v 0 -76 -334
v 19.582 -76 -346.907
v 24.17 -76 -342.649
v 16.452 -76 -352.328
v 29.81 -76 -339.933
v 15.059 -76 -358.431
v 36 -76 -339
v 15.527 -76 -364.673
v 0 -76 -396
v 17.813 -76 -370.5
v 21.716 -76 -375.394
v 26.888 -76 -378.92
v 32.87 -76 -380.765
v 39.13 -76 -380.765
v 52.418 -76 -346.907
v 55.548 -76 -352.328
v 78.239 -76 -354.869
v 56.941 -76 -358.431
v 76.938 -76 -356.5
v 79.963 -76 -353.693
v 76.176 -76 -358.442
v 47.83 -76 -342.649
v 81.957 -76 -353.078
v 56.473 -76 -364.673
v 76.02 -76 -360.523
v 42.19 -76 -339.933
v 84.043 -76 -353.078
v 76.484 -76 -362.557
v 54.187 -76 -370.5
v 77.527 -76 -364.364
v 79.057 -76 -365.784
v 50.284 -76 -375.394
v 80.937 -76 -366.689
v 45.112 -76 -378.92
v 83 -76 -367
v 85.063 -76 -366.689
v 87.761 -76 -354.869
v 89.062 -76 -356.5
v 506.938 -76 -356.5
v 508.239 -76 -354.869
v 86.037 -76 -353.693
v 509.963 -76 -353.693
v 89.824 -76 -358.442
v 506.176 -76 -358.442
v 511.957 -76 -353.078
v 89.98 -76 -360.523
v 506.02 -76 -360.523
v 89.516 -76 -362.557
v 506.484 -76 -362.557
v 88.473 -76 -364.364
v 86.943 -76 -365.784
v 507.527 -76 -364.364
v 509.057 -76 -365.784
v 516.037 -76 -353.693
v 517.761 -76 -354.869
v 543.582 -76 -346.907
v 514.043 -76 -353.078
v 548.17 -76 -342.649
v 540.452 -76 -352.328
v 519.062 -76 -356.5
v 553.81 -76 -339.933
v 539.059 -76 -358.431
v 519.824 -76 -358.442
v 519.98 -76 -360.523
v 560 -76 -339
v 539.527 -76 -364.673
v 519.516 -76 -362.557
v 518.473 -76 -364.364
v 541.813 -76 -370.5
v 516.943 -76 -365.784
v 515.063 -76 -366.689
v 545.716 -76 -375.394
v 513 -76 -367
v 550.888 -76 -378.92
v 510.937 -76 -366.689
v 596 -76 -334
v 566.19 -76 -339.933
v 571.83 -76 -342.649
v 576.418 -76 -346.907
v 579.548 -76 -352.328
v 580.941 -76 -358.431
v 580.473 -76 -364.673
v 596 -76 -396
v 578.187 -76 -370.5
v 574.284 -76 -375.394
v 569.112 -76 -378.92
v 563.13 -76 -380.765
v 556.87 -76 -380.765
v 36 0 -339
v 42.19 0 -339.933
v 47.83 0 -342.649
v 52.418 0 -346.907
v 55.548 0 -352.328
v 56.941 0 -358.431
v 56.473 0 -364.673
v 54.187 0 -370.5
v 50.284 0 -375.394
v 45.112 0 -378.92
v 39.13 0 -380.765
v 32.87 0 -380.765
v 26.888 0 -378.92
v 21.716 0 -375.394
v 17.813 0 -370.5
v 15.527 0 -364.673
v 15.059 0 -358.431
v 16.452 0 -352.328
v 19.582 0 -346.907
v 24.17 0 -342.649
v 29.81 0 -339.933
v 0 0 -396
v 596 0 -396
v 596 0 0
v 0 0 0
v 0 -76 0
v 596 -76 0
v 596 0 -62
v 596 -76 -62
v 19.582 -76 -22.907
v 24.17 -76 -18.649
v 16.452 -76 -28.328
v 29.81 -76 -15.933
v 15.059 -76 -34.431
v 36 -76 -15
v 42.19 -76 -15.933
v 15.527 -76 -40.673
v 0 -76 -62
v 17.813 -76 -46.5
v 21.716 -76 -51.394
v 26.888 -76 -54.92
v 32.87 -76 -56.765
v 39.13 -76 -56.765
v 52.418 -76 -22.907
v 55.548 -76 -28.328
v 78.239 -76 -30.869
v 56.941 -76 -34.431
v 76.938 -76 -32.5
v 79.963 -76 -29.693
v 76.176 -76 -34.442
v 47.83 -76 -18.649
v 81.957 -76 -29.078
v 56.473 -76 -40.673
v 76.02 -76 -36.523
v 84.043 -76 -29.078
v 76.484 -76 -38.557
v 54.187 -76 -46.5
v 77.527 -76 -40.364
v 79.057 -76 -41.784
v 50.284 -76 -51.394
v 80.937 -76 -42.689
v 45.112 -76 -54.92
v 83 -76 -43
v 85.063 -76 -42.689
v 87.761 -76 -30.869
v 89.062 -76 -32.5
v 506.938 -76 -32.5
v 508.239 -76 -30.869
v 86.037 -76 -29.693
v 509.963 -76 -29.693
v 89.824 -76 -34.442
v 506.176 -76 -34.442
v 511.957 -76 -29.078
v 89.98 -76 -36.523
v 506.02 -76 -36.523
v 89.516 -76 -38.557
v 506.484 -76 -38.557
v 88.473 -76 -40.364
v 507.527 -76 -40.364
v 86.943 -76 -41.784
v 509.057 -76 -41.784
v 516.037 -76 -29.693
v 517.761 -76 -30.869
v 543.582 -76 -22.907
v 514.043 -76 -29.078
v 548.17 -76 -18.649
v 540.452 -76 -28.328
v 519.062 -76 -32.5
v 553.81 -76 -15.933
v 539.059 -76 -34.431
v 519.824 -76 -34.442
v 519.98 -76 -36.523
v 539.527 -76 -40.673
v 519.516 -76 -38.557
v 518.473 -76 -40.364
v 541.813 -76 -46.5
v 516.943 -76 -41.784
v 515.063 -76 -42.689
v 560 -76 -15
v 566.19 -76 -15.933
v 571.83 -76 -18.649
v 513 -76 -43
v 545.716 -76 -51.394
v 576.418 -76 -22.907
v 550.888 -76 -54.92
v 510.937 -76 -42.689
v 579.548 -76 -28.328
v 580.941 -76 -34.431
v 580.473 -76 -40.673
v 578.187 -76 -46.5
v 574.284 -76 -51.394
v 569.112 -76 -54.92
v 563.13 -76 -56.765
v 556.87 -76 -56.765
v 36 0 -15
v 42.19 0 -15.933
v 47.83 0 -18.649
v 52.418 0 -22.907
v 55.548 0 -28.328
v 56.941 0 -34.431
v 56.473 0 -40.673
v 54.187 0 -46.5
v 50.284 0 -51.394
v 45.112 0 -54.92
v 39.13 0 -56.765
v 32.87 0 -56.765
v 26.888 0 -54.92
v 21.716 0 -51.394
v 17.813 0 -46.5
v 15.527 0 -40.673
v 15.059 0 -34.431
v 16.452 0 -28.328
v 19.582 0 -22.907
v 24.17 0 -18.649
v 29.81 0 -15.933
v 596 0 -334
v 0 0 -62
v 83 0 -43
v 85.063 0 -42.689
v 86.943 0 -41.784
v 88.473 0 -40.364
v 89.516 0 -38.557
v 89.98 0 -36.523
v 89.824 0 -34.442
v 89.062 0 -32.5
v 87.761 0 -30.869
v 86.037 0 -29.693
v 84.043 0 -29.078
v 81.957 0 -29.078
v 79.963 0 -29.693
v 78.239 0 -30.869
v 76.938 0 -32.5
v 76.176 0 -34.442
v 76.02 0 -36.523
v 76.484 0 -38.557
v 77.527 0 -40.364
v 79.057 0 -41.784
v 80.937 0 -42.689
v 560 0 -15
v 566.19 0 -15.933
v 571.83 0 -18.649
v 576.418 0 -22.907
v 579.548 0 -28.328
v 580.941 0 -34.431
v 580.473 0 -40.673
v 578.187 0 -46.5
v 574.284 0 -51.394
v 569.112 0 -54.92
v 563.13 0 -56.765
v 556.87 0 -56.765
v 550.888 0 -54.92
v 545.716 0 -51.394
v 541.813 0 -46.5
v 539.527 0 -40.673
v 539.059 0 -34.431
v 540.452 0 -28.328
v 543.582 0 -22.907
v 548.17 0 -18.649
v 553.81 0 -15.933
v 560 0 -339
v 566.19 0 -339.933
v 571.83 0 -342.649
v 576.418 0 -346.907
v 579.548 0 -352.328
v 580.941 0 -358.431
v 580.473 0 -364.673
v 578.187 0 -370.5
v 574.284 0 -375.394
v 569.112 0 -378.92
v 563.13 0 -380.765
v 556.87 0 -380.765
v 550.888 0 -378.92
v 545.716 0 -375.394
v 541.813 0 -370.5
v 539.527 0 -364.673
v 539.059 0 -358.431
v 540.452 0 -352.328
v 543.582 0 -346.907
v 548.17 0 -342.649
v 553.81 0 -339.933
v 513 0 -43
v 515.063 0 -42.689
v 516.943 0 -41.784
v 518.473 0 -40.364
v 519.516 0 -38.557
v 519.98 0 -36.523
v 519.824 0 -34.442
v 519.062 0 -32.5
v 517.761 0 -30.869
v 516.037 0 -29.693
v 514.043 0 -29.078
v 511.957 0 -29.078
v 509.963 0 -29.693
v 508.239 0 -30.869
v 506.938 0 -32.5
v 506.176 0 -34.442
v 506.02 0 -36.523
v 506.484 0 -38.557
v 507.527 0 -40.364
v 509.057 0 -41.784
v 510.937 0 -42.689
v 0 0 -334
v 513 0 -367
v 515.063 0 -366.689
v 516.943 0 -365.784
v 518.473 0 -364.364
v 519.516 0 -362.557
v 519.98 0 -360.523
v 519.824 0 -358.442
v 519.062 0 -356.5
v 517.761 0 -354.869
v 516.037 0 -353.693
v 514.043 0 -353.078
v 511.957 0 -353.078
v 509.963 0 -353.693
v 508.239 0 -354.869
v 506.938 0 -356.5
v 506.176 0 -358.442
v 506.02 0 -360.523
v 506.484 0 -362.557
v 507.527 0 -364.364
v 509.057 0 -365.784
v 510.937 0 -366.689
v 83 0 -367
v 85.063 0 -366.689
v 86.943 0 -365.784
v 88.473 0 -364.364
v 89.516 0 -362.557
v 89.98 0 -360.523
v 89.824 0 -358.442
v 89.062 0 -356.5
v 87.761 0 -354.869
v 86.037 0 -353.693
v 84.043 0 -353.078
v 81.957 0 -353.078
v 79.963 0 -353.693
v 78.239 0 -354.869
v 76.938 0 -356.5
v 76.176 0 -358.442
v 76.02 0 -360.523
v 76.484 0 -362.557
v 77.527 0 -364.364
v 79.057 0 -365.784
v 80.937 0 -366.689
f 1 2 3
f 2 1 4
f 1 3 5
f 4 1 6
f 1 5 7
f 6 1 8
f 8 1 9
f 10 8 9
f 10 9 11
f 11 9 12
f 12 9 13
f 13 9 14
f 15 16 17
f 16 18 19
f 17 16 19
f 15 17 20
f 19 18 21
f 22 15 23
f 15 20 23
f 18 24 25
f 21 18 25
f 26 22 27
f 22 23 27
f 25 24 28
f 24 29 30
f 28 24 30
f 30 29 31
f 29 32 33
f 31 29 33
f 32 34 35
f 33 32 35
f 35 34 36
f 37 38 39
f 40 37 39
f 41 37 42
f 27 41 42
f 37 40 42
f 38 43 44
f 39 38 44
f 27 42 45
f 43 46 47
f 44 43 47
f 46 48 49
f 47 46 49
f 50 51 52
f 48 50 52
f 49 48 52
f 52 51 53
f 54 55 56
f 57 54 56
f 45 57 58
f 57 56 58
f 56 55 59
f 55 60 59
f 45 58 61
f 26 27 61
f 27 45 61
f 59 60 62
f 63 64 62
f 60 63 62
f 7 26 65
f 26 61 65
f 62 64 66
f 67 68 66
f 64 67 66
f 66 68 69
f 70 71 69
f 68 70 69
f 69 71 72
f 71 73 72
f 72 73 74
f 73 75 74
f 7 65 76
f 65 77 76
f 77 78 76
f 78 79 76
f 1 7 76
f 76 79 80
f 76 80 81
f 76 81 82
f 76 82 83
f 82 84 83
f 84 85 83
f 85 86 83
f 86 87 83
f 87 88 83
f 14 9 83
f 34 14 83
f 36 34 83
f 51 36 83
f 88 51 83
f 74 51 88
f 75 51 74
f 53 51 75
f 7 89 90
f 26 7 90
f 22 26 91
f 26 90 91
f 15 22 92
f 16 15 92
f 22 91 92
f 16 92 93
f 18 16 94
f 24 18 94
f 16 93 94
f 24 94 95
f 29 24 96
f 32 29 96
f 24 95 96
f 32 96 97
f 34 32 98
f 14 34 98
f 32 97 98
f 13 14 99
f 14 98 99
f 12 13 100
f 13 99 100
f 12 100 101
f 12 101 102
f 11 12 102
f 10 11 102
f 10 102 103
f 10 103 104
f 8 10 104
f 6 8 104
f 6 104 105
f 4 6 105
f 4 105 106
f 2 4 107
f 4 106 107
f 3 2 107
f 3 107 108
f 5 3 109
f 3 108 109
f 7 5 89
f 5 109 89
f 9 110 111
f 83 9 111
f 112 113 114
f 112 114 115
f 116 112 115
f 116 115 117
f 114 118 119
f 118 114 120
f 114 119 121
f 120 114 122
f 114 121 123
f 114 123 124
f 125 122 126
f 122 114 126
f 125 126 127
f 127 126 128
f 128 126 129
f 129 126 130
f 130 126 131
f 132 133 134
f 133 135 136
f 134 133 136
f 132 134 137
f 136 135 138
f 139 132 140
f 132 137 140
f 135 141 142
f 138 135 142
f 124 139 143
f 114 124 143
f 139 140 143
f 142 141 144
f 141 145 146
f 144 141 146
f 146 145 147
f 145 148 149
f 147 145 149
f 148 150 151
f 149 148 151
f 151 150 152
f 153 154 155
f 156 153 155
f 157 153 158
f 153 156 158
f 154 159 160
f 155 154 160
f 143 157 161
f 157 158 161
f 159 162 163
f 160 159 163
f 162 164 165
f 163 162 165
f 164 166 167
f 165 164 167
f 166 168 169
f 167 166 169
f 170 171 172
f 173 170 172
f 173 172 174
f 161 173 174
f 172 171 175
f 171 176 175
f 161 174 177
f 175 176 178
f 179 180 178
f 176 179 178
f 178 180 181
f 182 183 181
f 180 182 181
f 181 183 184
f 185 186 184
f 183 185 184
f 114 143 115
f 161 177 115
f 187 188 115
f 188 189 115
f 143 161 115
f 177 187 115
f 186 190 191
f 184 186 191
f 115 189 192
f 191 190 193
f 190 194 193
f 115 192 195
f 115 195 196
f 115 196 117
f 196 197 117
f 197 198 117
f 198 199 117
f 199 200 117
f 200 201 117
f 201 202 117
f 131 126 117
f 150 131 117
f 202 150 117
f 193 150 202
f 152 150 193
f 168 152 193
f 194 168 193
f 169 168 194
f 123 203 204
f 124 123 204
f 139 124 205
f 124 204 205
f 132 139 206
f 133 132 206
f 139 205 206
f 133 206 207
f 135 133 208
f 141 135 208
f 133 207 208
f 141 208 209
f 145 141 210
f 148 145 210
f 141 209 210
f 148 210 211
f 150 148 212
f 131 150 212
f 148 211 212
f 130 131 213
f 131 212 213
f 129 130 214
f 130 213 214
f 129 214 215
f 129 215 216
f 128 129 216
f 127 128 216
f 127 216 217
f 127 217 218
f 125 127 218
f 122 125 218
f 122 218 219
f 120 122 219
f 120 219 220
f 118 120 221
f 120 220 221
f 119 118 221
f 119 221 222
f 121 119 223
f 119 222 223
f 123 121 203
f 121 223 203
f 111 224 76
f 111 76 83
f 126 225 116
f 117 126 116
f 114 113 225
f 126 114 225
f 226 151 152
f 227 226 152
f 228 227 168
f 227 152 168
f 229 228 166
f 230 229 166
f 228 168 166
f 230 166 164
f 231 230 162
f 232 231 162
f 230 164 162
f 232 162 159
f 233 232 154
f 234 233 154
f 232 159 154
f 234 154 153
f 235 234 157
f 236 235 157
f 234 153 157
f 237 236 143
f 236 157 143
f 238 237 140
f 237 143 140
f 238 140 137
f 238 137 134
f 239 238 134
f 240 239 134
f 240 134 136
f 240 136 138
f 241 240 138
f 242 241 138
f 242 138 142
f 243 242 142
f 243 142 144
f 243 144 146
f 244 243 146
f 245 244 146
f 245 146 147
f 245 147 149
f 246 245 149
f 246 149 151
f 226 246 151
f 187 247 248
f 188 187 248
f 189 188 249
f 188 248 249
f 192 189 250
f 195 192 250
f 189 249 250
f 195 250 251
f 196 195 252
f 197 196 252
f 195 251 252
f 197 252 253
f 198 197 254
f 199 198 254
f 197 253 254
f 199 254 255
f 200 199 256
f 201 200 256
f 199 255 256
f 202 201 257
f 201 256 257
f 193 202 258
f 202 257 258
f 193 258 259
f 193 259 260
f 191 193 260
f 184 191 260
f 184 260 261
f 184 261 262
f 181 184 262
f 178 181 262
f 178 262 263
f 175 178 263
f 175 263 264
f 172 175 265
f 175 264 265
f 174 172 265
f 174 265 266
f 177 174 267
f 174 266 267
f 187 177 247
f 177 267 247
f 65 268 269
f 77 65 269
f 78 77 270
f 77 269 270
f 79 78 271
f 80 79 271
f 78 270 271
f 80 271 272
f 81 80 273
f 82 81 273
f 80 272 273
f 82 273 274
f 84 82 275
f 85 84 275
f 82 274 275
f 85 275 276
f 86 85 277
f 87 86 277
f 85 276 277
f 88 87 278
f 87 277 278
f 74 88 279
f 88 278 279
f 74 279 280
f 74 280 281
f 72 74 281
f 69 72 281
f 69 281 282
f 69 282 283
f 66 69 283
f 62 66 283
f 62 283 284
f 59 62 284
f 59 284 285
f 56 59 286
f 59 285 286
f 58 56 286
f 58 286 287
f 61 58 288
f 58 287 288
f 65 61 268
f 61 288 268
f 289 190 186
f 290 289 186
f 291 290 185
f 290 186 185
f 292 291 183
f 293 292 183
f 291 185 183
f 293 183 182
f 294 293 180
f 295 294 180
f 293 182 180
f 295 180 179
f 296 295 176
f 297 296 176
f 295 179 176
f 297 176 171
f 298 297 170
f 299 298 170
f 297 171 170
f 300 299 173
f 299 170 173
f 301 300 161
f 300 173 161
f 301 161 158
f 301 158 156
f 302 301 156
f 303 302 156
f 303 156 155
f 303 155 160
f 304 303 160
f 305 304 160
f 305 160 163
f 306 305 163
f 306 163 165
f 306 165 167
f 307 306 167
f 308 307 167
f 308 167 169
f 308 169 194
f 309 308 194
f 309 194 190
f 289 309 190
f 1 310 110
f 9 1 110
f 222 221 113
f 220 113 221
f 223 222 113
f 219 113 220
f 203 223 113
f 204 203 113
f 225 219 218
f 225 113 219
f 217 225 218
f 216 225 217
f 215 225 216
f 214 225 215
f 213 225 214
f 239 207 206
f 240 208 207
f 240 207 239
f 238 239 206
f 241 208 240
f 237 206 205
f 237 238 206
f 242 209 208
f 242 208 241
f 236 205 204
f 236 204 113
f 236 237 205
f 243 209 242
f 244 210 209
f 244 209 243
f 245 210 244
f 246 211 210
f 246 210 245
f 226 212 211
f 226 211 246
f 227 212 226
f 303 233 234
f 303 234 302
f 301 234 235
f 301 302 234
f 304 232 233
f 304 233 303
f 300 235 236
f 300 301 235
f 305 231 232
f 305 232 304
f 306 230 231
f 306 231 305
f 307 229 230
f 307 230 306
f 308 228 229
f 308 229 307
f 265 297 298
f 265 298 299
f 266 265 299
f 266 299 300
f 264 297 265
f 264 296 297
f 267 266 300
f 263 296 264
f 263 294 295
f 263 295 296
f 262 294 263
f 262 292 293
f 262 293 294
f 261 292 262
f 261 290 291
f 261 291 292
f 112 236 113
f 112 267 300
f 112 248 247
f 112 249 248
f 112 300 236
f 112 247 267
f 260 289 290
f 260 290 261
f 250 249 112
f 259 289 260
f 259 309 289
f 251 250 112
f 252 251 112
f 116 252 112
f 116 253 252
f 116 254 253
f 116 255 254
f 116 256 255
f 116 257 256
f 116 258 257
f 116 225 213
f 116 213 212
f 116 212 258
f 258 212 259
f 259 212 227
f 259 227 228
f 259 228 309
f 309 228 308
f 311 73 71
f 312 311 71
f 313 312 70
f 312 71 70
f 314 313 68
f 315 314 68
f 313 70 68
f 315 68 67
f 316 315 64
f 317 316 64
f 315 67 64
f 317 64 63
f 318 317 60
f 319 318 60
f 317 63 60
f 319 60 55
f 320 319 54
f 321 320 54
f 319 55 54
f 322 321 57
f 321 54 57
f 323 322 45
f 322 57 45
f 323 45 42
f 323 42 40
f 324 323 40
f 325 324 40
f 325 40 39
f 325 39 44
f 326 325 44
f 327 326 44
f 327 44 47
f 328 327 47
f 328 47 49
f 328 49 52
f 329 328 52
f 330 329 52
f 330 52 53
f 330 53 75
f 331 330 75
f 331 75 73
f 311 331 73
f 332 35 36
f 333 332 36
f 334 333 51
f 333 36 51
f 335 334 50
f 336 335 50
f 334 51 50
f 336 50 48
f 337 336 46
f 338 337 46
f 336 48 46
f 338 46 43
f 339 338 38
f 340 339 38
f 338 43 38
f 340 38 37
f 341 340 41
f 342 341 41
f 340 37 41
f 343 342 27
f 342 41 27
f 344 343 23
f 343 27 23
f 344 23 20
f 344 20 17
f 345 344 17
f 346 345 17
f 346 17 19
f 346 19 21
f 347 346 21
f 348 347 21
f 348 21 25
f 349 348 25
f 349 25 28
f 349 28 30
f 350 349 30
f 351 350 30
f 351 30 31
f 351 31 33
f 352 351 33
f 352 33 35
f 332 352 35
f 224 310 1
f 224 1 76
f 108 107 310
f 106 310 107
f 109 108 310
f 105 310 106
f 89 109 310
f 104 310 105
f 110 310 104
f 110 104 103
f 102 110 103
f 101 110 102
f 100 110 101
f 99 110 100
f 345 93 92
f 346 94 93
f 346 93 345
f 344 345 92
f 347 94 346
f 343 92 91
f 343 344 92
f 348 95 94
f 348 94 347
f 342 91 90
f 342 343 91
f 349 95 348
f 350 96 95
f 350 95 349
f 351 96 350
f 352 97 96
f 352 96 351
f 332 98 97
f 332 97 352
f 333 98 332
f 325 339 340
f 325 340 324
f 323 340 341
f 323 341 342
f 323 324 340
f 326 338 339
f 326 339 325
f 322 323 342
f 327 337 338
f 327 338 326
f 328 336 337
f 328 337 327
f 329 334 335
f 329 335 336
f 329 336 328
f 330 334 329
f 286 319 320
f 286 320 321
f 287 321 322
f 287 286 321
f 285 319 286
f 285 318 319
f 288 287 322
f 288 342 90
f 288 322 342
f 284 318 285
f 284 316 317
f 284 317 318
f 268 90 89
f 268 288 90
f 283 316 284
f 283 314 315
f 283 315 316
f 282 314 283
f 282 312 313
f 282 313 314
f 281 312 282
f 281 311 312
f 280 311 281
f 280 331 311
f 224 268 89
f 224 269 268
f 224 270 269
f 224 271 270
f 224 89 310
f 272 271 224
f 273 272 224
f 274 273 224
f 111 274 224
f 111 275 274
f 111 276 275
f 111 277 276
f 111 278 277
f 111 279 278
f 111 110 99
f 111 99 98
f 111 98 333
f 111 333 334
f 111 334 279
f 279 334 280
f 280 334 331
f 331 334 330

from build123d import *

# Parameters (mm, degrees)
SZKIC1_W                    = 596
SZKIC1_H                    = 396
SZKIC1_R                    = 24
SZKIC1_R_2                  = 21
DODANIE_WYCI_GNI_CIE1_DEPTH = 76
OTW_R_GWINTOWANY_M161_D     = 14
SZKIC4_W                    = 668.849986018
SZKIC4_H                    = 272
WYTNIJ_WYCI_GNI_CIE1_DEPTH  = 108


with BuildPart() as part:
    # Szkic1 → Dodanie-wyciągnięcie1 (new body)
    # profile 1 of 5: a face of its own
    with BuildSketch(Plane(origin=(0, 0, 0), x_dir=(1, 0, 0), z_dir=(0, 1, 0))):
        with Locations((298, 198)):
            Rectangle(SZKIC1_W, SZKIC1_H)
        with Locations((560, 360)):
            Circle(SZKIC1_R, mode=Mode.SUBTRACT)
        with Locations((36, 360)):
            Circle(SZKIC1_R, mode=Mode.SUBTRACT)
        with Locations((560, 36)):
            Circle(SZKIC1_R, mode=Mode.SUBTRACT)
        with Locations((36, 36)):
            Circle(SZKIC1_R, mode=Mode.SUBTRACT)
    # profile 2 of 5: a face of its own
    with BuildSketch(Plane(origin=(0, 0, 0), x_dir=(1, 0, 0), z_dir=(0, 1, 0))):
        with Locations((36, 36)):
            Circle(SZKIC1_R)
        with Locations(Location((36, 36, 0), (0, 0, 270))):
            Circle(SZKIC1_R_2, mode=Mode.SUBTRACT)
    # profile 3 of 5: a face of its own
    with BuildSketch(Plane(origin=(0, 0, 0), x_dir=(1, 0, 0), z_dir=(0, 1, 0))):
        with Locations((560, 36)):
            Circle(SZKIC1_R)
        with Locations(Location((560, 36, 0), (0, 0, 270))):
            Circle(SZKIC1_R_2, mode=Mode.SUBTRACT)
    # profile 4 of 5: a face of its own
    with BuildSketch(Plane(origin=(0, 0, 0), x_dir=(1, 0, 0), z_dir=(0, 1, 0))):
        with Locations((560, 360)):
            Circle(SZKIC1_R)
        with Locations(Location((560, 360, 0), (0, 0, 270))):
            Circle(SZKIC1_R_2, mode=Mode.SUBTRACT)
    # profile 5 of 5: a face of its own
    with BuildSketch(Plane(origin=(0, 0, 0), x_dir=(1, 0, 0), z_dir=(0, 1, 0))):
        with Locations((36, 360)):
            Circle(SZKIC1_R)
        with Locations(Location((36, 360, 0), (0, 0, 270))):
            Circle(SZKIC1_R_2, mode=Mode.SUBTRACT)
    extrude(amount=-DODANIE_WYCI_GNI_CIE1_DEPTH)

    # Otwór gwintowany M161 (through all)
    with Locations(Plane(origin=(83, 0, -360), x_dir=(0, 0, 1), z_dir=(0, 1, 0))):
        with Locations((0, 0), (0, 430), (324, 0), (324, 430)):
            Hole(OTW_R_GWINTOWANY_M161_D / 2)

    # Szkic4 → Wytnij-wyciągnięcie1 (cut)
    with BuildSketch(Plane(origin=(0, 0, 0), x_dir=(1, 0, 0), z_dir=(0, 1, 0))):
        with Locations((297.106611773, 198)):
            Rectangle(SZKIC4_W, SZKIC4_H)
    extrude(amount=-WYTNIJ_WYCI_GNI_CIE1_DEPTH, mode=Mode.SUBTRACT)


with BuildPart() as wytnij_wyci_gni_cie1_piece_1:
    # of the separate pieces the step leaves, piece 1, a body of its own (wytnij_wyci_gni_cie1_pieces)
    add(part.part.solids().sort_by_distance((0, 0, 0))[0])


with BuildPart() as wytnij_wyci_gni_cie1_piece_2:
    # of the separate pieces the step leaves, piece 2, a body of its own (wytnij_wyci_gni_cie1_pieces)
    add(part.part.solids().sort_by_distance((0, 0, -396))[0])


solid = Compound([wytnij_wyci_gni_cie1_piece_1.part, wytnij_wyci_gni_cie1_piece_2.part])
